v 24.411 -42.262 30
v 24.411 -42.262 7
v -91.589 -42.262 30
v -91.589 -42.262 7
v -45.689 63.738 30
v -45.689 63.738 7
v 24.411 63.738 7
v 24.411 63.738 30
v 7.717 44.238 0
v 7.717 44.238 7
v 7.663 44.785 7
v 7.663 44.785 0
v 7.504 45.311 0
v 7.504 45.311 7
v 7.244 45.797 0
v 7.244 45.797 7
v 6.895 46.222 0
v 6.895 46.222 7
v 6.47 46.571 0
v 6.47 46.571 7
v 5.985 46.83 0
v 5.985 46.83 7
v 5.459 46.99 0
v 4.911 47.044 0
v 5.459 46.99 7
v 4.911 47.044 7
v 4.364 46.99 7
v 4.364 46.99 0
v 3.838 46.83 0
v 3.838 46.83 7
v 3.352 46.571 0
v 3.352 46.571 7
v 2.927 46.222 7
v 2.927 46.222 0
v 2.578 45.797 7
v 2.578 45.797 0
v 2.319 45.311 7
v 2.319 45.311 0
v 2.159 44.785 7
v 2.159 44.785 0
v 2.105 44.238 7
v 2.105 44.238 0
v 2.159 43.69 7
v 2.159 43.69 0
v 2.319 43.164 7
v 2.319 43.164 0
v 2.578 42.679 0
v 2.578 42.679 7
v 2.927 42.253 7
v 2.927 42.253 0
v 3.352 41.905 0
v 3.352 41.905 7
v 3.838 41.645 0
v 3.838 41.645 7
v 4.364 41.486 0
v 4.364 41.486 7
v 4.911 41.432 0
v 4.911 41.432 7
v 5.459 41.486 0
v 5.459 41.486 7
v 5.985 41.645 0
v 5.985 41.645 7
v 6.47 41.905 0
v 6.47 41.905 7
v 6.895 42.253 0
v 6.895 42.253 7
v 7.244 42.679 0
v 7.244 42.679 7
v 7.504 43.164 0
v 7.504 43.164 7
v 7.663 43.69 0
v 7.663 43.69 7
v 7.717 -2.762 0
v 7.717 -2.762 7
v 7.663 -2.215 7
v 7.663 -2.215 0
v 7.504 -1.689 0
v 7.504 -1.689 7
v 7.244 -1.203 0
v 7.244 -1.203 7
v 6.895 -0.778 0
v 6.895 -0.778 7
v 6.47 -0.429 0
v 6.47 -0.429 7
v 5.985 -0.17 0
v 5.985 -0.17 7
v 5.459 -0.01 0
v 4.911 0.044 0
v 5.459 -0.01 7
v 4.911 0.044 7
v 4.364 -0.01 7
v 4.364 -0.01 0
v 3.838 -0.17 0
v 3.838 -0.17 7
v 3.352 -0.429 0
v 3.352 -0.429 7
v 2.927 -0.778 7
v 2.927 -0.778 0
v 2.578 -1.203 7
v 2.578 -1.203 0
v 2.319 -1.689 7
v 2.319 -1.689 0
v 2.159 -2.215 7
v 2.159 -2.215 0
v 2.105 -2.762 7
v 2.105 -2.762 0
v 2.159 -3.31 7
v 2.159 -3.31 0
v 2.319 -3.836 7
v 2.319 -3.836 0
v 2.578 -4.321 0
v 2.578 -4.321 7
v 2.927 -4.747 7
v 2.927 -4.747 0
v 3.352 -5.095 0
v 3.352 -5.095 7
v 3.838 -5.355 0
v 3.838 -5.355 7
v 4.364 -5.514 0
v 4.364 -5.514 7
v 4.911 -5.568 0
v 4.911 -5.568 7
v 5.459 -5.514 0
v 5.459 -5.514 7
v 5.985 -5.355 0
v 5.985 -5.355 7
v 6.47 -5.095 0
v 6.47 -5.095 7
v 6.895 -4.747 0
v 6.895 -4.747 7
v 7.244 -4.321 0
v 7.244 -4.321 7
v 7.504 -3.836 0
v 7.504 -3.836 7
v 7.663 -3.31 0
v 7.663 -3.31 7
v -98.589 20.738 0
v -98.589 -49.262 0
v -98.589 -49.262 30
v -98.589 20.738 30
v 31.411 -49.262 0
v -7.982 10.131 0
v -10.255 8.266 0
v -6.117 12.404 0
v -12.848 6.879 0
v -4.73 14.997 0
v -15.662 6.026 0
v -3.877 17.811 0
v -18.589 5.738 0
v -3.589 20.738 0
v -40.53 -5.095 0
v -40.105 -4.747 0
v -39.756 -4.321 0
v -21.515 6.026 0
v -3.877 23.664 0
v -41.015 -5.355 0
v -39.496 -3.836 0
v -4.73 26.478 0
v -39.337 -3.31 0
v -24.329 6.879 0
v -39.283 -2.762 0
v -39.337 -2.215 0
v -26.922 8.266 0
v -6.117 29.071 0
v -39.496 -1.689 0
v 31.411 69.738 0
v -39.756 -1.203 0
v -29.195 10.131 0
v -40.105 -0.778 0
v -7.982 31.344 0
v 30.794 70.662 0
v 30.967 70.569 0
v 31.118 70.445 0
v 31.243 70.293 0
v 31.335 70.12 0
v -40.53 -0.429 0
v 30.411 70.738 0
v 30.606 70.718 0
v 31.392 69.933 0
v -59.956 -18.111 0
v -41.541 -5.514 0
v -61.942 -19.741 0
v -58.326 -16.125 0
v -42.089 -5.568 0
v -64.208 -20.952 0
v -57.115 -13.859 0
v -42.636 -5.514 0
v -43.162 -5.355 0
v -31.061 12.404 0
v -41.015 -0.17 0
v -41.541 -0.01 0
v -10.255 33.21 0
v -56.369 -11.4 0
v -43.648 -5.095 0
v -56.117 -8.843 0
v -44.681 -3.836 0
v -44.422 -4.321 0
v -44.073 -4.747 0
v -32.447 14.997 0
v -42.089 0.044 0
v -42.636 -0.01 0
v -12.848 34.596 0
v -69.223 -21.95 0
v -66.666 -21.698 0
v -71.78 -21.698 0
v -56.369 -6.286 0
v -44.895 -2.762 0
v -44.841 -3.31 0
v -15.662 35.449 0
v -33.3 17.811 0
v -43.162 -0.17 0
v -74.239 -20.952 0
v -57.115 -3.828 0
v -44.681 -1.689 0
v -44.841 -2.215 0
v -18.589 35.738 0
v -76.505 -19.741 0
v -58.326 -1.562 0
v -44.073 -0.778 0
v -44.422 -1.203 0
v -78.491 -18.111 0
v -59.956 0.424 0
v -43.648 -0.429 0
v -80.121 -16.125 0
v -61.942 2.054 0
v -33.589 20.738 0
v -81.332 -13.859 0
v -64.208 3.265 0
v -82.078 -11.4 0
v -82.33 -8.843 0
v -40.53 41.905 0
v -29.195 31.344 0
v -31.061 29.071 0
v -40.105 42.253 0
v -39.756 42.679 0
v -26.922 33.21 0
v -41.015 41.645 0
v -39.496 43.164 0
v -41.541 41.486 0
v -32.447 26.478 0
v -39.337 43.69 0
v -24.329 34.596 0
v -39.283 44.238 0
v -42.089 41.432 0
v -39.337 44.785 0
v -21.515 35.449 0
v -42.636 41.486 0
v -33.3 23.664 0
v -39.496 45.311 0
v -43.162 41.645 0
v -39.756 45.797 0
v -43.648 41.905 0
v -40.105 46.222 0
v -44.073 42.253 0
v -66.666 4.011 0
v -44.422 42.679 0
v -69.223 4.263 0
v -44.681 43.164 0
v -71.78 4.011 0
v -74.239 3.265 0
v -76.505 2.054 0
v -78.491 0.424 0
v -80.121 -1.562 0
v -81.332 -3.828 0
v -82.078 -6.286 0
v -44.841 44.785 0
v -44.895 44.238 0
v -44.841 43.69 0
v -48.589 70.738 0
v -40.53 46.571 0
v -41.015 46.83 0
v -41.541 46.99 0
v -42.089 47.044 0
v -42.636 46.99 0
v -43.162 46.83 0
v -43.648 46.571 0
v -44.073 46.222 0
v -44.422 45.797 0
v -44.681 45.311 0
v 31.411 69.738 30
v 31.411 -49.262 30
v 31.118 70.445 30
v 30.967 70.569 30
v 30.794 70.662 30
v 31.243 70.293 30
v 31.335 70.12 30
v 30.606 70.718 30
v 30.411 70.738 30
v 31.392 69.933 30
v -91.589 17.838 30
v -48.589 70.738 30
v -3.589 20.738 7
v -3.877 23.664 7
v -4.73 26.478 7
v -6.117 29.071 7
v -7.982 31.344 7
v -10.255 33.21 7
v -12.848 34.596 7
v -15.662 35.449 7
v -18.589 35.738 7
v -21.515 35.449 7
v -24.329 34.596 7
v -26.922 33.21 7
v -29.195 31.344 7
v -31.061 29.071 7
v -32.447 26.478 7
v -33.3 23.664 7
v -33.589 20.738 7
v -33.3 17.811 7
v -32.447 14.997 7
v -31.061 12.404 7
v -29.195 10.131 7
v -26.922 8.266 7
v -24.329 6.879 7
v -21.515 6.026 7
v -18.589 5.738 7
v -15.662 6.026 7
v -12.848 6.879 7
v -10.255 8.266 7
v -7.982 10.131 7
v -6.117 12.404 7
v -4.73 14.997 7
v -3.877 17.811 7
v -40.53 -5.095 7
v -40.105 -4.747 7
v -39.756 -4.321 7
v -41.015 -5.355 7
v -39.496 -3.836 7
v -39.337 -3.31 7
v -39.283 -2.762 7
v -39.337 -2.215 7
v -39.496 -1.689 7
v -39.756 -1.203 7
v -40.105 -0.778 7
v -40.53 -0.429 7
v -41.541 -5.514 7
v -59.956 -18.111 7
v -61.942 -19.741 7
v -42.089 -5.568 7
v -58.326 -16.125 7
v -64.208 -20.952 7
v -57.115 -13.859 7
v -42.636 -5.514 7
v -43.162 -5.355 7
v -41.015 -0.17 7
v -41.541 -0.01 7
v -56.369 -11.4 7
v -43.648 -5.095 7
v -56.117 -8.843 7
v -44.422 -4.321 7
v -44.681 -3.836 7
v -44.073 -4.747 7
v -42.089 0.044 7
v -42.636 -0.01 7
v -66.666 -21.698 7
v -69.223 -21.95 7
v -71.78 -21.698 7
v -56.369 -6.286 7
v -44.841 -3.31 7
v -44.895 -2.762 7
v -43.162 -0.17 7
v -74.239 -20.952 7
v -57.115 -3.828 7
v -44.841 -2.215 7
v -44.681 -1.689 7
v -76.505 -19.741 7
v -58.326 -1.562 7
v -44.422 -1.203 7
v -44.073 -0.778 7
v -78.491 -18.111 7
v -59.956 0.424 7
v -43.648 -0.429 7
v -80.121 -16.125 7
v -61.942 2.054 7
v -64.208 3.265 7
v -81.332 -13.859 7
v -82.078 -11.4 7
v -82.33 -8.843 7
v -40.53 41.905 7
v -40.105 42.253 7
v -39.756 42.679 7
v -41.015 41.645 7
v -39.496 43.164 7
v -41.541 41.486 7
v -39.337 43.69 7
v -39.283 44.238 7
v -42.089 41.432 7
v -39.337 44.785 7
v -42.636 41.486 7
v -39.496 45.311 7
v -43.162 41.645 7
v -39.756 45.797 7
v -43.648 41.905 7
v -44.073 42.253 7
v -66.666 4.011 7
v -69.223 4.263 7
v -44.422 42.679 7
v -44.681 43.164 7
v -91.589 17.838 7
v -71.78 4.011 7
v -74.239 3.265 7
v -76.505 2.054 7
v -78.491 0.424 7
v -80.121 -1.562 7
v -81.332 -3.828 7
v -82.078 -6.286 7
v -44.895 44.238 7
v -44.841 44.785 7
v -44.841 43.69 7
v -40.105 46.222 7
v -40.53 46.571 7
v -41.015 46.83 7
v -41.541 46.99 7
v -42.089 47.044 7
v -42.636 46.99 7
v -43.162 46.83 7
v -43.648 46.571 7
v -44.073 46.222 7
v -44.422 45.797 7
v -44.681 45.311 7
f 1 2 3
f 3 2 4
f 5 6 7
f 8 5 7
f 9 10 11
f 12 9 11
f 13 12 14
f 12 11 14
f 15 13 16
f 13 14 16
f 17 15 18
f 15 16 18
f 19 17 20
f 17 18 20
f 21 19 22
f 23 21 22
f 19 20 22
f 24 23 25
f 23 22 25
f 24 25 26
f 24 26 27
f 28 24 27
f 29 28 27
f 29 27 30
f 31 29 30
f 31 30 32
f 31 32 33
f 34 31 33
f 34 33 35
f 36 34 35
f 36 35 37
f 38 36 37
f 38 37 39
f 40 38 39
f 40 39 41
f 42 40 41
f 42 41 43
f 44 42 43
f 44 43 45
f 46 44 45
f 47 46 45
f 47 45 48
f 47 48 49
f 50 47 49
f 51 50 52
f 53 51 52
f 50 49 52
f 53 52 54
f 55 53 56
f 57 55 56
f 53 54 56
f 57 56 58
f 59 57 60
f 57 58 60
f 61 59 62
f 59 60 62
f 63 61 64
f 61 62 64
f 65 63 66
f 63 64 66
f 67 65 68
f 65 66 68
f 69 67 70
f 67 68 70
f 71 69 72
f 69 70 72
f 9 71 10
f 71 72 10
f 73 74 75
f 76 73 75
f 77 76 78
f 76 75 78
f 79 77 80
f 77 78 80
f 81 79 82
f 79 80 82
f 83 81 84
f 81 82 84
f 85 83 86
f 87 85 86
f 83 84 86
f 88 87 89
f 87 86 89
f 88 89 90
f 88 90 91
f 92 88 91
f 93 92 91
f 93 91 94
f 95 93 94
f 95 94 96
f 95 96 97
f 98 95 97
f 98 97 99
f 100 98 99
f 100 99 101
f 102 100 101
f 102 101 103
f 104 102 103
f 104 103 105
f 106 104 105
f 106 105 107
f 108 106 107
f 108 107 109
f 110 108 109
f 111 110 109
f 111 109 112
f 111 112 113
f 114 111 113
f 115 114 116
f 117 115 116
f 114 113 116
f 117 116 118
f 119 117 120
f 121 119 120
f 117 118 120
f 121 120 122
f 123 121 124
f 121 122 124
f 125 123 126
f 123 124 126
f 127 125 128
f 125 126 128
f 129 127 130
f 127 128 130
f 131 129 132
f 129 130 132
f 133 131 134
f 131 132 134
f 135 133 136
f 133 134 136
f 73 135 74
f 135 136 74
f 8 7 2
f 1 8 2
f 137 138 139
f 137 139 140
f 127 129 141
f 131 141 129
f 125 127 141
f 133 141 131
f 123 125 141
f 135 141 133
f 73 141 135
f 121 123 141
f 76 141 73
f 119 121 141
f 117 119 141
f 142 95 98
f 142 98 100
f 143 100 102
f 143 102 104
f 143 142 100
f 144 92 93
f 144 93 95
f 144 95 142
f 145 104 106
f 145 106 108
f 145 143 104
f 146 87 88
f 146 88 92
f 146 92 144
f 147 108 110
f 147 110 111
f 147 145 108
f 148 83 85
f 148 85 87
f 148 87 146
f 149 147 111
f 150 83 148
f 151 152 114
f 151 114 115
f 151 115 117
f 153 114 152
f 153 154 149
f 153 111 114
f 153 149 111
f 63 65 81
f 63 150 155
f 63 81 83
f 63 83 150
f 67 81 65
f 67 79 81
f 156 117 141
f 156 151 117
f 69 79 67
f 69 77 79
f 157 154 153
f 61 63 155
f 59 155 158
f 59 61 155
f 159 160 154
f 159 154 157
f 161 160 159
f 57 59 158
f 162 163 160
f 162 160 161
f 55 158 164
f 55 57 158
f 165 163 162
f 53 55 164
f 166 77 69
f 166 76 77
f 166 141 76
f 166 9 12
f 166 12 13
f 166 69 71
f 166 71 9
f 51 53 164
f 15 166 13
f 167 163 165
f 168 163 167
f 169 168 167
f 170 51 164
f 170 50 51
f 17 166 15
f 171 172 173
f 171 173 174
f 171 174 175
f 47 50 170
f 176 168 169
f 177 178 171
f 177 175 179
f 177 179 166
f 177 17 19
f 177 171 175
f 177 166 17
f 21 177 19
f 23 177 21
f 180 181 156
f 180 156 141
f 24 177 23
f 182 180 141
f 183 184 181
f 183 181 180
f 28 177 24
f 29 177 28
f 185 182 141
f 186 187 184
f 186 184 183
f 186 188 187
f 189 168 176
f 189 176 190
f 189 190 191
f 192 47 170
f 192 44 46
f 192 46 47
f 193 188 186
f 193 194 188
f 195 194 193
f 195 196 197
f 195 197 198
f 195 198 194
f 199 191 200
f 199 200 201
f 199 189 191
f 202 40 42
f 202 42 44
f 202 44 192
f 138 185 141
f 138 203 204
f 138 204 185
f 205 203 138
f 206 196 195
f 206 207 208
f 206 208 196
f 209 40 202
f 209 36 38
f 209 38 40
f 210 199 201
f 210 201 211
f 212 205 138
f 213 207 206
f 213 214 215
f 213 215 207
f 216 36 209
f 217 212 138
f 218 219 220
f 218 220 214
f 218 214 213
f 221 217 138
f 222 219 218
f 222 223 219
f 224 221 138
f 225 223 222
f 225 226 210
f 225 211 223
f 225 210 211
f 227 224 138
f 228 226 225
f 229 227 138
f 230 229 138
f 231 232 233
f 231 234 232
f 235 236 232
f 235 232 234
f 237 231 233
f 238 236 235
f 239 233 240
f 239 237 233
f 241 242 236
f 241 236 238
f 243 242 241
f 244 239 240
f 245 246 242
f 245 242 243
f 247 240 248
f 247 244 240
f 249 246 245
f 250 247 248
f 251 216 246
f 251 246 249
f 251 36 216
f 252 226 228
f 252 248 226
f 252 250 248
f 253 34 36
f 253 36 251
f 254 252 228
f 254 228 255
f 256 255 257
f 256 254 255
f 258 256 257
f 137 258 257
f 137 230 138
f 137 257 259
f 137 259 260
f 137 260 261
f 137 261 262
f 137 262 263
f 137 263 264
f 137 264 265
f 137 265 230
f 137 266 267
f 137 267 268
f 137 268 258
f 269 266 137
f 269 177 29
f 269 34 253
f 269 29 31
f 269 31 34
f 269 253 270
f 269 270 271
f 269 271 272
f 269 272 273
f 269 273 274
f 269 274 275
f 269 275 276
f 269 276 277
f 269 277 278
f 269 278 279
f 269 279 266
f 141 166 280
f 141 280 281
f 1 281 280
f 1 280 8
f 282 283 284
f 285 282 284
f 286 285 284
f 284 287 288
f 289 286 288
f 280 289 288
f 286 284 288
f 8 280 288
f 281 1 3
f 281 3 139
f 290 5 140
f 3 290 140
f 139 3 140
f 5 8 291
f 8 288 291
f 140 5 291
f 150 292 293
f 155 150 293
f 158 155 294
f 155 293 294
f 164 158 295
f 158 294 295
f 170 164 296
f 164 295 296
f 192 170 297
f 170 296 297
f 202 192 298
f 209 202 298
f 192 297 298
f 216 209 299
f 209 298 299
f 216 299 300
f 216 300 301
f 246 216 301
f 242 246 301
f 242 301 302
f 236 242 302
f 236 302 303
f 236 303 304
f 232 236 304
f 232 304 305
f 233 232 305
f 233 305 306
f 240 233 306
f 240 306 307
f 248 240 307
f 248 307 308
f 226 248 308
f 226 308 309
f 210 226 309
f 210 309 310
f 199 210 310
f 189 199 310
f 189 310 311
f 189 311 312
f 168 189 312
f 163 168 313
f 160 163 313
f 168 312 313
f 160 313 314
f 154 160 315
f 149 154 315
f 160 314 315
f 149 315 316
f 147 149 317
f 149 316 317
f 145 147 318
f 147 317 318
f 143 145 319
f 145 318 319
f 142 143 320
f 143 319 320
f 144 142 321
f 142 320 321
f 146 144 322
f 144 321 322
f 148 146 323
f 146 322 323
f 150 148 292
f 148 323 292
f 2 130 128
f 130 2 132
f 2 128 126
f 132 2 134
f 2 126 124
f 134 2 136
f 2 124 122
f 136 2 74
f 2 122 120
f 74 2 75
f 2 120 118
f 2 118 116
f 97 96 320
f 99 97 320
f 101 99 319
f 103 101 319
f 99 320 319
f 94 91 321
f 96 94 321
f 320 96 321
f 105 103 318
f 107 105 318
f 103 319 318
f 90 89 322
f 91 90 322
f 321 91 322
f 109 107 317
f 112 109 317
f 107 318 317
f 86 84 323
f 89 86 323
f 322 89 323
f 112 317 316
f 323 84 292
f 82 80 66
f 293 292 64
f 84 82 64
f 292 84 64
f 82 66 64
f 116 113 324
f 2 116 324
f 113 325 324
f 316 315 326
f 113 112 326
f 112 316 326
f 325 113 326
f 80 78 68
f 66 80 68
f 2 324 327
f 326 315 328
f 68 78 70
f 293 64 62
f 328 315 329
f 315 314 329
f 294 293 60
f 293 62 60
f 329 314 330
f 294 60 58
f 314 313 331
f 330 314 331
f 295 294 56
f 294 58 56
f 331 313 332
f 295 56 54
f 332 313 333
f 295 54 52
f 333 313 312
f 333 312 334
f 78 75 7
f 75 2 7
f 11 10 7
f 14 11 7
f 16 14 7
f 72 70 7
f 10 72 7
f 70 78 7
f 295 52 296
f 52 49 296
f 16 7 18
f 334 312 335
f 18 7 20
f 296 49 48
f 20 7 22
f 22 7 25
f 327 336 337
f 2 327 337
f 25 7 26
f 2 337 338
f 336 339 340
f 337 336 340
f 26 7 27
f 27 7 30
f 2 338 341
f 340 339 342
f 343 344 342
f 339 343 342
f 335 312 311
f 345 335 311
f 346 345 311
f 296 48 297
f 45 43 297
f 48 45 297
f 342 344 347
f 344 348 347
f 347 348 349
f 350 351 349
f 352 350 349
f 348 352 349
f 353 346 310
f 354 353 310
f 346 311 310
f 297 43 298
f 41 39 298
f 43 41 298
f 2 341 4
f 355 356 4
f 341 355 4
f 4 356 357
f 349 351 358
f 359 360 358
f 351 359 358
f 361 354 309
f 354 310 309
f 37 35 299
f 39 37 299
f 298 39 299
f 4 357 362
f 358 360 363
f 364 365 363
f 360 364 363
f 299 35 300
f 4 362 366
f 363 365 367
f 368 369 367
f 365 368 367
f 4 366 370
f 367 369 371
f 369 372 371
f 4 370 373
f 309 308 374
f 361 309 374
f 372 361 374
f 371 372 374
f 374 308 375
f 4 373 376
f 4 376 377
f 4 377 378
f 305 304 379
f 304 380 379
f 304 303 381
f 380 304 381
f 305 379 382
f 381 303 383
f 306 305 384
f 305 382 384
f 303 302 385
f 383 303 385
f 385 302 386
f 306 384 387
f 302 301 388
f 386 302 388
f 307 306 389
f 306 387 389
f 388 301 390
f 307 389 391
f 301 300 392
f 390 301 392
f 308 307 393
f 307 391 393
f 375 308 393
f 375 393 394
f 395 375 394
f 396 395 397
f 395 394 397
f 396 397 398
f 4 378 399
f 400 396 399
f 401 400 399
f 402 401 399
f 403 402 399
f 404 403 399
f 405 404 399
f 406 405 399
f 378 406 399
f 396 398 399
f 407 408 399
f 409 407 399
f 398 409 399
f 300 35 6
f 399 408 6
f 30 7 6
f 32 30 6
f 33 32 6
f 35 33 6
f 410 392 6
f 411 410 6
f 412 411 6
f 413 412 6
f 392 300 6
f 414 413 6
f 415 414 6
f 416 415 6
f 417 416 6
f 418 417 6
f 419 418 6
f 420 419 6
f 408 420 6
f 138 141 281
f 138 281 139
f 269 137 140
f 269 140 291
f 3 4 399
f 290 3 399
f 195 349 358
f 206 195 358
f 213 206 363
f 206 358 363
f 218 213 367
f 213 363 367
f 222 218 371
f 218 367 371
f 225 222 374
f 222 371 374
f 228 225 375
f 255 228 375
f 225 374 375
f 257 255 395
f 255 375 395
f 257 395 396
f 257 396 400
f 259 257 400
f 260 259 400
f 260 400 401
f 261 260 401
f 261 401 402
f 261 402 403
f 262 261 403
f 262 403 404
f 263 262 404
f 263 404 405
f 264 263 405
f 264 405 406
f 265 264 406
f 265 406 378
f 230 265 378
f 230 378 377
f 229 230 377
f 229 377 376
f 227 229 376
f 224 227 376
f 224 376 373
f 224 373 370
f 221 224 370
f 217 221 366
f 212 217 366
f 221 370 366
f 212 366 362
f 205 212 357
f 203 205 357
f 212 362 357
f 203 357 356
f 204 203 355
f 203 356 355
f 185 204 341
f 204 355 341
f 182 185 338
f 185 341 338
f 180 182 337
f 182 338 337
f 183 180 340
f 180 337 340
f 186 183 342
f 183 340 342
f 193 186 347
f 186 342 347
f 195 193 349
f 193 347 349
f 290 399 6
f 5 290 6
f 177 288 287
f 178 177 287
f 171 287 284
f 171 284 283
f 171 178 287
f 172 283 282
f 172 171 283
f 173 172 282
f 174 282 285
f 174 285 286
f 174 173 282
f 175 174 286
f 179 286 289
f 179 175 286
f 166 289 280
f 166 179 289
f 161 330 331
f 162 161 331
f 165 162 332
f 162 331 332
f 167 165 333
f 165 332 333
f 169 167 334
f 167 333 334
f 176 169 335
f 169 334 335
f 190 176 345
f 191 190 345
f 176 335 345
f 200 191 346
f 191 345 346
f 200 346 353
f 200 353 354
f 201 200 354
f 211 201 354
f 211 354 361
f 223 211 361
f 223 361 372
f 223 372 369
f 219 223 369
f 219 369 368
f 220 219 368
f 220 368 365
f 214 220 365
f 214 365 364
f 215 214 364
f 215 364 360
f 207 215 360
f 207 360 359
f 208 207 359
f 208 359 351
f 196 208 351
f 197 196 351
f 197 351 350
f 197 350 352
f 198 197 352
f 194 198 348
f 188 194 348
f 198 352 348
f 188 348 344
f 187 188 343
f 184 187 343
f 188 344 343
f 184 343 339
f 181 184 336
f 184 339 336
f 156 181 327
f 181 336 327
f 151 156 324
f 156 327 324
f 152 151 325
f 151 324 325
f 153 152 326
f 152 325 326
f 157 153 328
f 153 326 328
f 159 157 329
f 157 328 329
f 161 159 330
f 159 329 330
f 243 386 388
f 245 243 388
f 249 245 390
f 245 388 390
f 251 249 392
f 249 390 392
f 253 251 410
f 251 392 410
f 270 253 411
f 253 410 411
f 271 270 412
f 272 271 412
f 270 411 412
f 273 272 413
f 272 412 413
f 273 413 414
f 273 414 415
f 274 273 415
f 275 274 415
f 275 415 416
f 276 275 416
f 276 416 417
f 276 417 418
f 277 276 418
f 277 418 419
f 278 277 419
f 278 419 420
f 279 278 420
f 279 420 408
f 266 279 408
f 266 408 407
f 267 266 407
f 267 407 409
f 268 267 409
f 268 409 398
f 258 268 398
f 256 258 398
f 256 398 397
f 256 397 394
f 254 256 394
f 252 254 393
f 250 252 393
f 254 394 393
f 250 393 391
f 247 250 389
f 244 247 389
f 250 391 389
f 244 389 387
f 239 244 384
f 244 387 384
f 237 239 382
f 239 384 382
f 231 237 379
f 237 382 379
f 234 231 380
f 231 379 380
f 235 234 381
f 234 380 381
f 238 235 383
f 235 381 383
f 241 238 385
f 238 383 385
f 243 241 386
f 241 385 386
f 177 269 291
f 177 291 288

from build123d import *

# Parameters (mm, degrees)
BOSS_EXTRUDE1_DEPTH  = 30
SHELL1_T             = -7
SKETCH2_R            = 15
CUT_EXTRUDE1_DEPTH   = 20
SKETCH3_R            = 2.805999004
CUT_EXTRUDE2_DEPTH   = 20
LPATTERN1_COUNT      = 2
LPATTERN1_PITCH      = 47
LPATTERN1_COUNT_DIR2 = 2
LPATTERN1_PITCH_DIR2 = 47
SKETCH4_R            = 13.106496876
CUT_EXTRUDE3_DEPTH   = 20


with BuildPart() as part:
    # Sketch1 → Boss-Extrude1 (new body)
    with BuildSketch(Plane.XY):
        with BuildLine():
            Line((-98.588677058, 20.737627793), (-48.588677058, 70.737627793))
            Line((-48.588677058, 70.737627793), (30.411322942, 70.737627793))
            ThreePointArc((30.411322942, 70.737627793), (31.118429723, 70.444734574), (31.411322942, 69.737627793))
            Line((31.411322942, 69.737627793), (31.411322942, -49.262372207))
            Line((31.411322942, -49.262372207), (-98.588677058, -49.262372207))
            Line((-98.588677058, -49.262372207), (-98.588677058, 20.737627793))
        make_face()
    extrude(amount=BOSS_EXTRUDE1_DEPTH)

    # Shell1
    shell1_openings = [part.faces().sort_by_distance(p)[0] for p in [
        (-29.379362159, 6.961996775, 30),
    ]]
    offset(amount=SHELL1_T, openings=shell1_openings, kind=Kind.INTERSECTION)

    # Sketch2 → Cut-Extrude1 (cut)
    with BuildSketch(Plane.XY.offset(7)):
        with Locations((-18.588677058, 20.737627793)):
            Circle(SKETCH2_R)
    extrude(amount=-CUT_EXTRUDE1_DEPTH, mode=Mode.SUBTRACT)

    # Sketch3 → Cut-Extrude2 (cut)
    with BuildSketch(Plane.XY.offset(7)):
        with Locations((-42.088677058, 44.237627793)):
            Circle(SKETCH3_R)
    cut_extrude2 = extrude(amount=-CUT_EXTRUDE2_DEPTH, mode=Mode.SUBTRACT)

    # LPattern1: Cut-Extrude2 2 × 2
    with Locations(*[(i * LPATTERN1_PITCH, -j * LPATTERN1_PITCH_DIR2, 0) for i in range(LPATTERN1_COUNT) for j in range(LPATTERN1_COUNT_DIR2) if (i, j) != (0, 0)]):
        add(cut_extrude2, mode=Mode.SUBTRACT)

    # Sketch4 → Cut-Extrude3 (cut)
    with BuildSketch(Plane.XY.offset(7)):
        with Locations((-69.22336781, -8.843391448)):
            Circle(SKETCH4_R)
    extrude(amount=-CUT_EXTRUDE3_DEPTH, mode=Mode.SUBTRACT)


solid = part.part
